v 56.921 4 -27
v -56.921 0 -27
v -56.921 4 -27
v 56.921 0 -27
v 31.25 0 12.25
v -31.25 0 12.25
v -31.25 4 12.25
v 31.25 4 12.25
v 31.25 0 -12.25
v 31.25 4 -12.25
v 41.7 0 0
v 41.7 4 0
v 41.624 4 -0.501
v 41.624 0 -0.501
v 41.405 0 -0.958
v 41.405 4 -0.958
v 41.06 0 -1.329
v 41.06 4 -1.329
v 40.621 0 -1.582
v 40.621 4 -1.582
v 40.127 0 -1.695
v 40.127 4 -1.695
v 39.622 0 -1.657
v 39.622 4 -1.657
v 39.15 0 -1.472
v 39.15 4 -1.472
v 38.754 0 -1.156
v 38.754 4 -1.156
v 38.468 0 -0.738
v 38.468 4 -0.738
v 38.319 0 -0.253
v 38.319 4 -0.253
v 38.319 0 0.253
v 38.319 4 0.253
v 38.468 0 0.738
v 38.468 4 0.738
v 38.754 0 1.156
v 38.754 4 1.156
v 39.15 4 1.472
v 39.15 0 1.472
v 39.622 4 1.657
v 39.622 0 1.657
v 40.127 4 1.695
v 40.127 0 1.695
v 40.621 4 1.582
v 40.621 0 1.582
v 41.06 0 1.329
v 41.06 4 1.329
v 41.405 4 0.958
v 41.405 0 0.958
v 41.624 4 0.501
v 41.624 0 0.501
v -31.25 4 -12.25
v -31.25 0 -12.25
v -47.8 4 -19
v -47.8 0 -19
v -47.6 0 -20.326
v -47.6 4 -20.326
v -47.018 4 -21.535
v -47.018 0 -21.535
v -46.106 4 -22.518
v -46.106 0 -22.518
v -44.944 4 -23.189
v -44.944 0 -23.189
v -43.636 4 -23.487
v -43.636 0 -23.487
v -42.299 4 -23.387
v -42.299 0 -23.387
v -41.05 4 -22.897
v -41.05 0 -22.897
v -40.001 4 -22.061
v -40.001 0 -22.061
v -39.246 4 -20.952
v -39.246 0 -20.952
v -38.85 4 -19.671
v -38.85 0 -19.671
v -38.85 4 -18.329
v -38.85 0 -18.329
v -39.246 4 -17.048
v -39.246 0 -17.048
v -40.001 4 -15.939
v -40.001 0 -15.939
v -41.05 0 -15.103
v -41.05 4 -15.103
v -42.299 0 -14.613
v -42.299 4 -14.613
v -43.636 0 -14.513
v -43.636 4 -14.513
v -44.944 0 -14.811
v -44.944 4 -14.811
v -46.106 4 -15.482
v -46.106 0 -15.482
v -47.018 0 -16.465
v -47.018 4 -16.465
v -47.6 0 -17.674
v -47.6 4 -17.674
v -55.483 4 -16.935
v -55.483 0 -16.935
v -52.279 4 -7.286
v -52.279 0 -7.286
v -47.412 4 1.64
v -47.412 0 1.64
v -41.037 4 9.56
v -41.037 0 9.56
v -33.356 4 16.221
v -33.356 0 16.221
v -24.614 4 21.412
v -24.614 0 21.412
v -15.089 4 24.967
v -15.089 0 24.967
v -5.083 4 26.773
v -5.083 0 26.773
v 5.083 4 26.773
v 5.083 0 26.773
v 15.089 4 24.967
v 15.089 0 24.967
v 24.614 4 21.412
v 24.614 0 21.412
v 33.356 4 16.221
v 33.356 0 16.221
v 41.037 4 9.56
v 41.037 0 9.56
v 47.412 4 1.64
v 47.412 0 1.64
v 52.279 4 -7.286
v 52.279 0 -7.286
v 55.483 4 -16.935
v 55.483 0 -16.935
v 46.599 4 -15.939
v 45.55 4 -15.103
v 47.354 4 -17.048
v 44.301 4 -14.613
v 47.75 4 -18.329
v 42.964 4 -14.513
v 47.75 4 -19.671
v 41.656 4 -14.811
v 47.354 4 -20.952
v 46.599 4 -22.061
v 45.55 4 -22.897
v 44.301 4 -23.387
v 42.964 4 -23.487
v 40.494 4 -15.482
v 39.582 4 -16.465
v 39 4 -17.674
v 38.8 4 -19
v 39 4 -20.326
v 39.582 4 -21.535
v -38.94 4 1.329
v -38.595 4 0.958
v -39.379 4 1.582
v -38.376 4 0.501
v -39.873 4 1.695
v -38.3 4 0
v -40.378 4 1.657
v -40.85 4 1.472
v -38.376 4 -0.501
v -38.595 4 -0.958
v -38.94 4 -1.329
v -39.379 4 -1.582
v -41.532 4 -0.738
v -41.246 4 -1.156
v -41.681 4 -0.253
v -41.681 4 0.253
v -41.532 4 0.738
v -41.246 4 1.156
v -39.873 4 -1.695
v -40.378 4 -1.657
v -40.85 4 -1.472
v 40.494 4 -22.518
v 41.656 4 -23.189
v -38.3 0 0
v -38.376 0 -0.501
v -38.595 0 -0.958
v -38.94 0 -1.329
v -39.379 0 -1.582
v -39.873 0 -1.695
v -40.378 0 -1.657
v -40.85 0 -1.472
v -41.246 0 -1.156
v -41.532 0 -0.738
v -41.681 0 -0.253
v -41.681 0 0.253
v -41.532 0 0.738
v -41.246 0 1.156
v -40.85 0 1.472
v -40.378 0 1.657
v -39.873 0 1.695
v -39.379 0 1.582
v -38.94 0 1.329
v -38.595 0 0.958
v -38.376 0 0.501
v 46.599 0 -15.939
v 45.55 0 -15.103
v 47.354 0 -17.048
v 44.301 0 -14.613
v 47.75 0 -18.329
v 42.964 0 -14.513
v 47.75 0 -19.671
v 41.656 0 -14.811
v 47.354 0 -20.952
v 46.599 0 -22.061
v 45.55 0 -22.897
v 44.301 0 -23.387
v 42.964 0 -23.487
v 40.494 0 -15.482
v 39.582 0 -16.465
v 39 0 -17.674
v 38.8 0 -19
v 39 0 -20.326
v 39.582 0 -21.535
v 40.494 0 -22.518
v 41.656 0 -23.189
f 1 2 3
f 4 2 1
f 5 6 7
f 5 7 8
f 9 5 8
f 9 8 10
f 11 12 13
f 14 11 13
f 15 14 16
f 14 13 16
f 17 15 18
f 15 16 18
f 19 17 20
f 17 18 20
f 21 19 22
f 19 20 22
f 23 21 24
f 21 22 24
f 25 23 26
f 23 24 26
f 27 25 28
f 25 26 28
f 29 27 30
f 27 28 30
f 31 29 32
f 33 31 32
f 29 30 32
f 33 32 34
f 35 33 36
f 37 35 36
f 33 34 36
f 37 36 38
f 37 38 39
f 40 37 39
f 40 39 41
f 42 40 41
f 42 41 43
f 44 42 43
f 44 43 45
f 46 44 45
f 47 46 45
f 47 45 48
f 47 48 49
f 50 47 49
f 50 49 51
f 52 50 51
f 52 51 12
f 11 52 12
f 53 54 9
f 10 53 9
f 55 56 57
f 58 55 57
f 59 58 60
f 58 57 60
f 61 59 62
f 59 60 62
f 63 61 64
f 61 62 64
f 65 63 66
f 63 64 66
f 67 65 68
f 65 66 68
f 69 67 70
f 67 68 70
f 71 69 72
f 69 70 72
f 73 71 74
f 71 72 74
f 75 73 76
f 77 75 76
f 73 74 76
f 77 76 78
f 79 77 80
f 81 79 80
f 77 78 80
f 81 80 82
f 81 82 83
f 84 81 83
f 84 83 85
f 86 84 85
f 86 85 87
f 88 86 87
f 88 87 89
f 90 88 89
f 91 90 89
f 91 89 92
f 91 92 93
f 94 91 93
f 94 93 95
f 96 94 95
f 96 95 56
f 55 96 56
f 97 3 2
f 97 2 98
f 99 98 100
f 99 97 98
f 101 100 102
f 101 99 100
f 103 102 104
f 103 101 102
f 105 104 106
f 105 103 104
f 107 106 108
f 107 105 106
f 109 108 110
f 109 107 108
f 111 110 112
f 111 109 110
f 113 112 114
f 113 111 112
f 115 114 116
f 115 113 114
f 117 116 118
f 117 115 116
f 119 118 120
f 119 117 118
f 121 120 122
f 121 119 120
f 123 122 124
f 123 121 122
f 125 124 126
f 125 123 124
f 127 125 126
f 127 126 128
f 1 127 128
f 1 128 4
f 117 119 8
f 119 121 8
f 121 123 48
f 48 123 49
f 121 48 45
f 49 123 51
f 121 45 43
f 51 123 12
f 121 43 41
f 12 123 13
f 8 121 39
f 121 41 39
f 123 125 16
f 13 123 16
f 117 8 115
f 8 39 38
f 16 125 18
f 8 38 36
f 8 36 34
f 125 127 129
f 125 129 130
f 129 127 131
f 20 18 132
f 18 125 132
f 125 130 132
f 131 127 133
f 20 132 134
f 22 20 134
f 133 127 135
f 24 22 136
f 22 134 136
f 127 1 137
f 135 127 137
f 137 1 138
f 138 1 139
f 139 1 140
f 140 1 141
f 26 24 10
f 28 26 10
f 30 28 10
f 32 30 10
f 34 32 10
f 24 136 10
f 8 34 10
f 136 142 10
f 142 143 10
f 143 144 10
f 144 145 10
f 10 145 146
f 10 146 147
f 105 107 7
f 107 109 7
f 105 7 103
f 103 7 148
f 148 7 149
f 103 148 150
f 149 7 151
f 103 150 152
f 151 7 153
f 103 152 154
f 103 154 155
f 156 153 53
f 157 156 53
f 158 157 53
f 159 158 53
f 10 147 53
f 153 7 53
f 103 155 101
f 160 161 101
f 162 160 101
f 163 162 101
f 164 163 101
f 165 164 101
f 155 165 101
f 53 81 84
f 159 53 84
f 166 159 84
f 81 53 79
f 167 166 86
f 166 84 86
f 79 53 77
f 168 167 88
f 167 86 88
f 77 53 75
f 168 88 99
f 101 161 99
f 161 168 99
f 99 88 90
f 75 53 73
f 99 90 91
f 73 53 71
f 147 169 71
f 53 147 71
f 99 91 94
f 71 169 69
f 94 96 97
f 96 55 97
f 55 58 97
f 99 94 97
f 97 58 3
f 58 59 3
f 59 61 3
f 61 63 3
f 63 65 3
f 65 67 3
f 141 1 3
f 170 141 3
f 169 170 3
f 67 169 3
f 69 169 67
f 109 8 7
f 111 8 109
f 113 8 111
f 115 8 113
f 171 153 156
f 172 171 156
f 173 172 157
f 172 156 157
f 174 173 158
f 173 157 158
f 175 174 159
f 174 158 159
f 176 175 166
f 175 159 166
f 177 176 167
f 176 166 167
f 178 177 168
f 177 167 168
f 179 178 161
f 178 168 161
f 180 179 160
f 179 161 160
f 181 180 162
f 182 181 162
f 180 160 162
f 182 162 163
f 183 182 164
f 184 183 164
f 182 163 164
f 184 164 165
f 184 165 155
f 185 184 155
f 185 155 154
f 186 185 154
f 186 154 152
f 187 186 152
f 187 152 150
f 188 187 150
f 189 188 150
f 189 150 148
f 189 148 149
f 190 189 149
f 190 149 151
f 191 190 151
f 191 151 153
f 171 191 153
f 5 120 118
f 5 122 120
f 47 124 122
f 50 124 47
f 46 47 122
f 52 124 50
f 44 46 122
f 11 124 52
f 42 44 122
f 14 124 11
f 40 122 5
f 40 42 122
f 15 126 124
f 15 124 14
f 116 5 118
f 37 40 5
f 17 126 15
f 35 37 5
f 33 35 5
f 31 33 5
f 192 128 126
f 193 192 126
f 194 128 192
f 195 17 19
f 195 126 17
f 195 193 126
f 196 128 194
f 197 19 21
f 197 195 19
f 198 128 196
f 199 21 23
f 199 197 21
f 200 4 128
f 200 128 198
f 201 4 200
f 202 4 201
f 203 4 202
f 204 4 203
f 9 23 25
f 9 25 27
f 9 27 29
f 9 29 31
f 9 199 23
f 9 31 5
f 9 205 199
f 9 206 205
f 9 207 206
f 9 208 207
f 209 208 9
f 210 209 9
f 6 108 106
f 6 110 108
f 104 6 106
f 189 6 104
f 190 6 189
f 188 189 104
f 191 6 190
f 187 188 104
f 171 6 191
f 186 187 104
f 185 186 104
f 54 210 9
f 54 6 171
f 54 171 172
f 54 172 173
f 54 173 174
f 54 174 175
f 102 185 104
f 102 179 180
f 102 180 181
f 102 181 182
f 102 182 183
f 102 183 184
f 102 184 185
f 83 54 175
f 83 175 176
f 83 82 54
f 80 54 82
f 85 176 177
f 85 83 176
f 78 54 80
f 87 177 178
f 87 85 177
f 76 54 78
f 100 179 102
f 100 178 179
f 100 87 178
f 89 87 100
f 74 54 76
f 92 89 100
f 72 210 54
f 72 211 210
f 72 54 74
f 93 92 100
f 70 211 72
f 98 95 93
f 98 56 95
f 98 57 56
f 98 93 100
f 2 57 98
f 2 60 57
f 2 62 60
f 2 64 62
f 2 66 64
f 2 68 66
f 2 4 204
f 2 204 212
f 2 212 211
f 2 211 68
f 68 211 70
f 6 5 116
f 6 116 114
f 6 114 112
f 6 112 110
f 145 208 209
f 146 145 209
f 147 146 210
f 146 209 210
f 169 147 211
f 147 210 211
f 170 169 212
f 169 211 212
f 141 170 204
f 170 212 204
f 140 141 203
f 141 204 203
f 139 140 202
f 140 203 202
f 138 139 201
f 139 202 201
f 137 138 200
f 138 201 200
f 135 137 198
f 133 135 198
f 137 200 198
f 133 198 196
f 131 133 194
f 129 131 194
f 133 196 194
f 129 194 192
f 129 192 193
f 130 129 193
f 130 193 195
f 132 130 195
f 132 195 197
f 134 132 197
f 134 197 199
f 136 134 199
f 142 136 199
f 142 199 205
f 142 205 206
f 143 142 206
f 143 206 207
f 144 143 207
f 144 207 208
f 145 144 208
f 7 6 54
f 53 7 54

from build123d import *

# Parameters (mm, degrees)
ESQUISSE1_W             = 62.5
ESQUISSE1_H             = 24.5
BOSS_EXTRU_1_DEPTH      = 4
D_GAGEMENT_M81_D        = 9
ESQUISSE5_R             = 132
ESQUISSE5_R_2           = 57
ENL_V_MAT_EXTRU_1_DEPTH = 73.705605447
D_GAGEMENT_M31_D        = 3.4


with BuildPart() as part:
    # Esquisse1 → Boss.-Extru.1 (new body)
    with BuildSketch(Plane(origin=(0, 0, 0), x_dir=(1, 0, 0), z_dir=(0, 1, 0))):
        Polygon((-58.901607841, -13.53209338), (-58.901607841, 27), (59.427941441, 27), (59.427941441, -12.756380319), (59.427941441, -41.694422162), (-58.901607841, -41.694422162), align=None)
        Rectangle(ESQUISSE1_W, ESQUISSE1_H, mode=Mode.SUBTRACT)
    extrude(amount=BOSS_EXTRU_1_DEPTH)

    # Dégagement M81 (through all)
    with Locations(Plane(origin=(0, 4, 0), x_dir=(1, 0, 0), z_dir=(0, 1, 0))):
        with Locations((-43.3, 19), (43.3, 19)):
            Hole(D_GAGEMENT_M81_D / 2)

    # Esquisse5 → Enlèv. mat.-Extru.1 (cut, through all)
    with BuildSketch(Plane(origin=(0, 4, 0), x_dir=(1, 0, 0), z_dir=(0, 1, 0))):
        with Locations((0, 30)):
            Circle(ESQUISSE5_R)
        with Locations((0, 30)):
            Circle(ESQUISSE5_R_2, mode=Mode.SUBTRACT)
    extrude(amount=-ENL_V_MAT_EXTRU_1_DEPTH, mode=Mode.SUBTRACT)

    # Dégagement M31 (through all)
    with Locations(Plane(origin=(0, 0, 0), x_dir=(-1, 0, 0), z_dir=(0, -1, 0))):
        with Locations((-40, 0), (40, 0)):
            Hole(D_GAGEMENT_M31_D / 2)


solid = part.part
